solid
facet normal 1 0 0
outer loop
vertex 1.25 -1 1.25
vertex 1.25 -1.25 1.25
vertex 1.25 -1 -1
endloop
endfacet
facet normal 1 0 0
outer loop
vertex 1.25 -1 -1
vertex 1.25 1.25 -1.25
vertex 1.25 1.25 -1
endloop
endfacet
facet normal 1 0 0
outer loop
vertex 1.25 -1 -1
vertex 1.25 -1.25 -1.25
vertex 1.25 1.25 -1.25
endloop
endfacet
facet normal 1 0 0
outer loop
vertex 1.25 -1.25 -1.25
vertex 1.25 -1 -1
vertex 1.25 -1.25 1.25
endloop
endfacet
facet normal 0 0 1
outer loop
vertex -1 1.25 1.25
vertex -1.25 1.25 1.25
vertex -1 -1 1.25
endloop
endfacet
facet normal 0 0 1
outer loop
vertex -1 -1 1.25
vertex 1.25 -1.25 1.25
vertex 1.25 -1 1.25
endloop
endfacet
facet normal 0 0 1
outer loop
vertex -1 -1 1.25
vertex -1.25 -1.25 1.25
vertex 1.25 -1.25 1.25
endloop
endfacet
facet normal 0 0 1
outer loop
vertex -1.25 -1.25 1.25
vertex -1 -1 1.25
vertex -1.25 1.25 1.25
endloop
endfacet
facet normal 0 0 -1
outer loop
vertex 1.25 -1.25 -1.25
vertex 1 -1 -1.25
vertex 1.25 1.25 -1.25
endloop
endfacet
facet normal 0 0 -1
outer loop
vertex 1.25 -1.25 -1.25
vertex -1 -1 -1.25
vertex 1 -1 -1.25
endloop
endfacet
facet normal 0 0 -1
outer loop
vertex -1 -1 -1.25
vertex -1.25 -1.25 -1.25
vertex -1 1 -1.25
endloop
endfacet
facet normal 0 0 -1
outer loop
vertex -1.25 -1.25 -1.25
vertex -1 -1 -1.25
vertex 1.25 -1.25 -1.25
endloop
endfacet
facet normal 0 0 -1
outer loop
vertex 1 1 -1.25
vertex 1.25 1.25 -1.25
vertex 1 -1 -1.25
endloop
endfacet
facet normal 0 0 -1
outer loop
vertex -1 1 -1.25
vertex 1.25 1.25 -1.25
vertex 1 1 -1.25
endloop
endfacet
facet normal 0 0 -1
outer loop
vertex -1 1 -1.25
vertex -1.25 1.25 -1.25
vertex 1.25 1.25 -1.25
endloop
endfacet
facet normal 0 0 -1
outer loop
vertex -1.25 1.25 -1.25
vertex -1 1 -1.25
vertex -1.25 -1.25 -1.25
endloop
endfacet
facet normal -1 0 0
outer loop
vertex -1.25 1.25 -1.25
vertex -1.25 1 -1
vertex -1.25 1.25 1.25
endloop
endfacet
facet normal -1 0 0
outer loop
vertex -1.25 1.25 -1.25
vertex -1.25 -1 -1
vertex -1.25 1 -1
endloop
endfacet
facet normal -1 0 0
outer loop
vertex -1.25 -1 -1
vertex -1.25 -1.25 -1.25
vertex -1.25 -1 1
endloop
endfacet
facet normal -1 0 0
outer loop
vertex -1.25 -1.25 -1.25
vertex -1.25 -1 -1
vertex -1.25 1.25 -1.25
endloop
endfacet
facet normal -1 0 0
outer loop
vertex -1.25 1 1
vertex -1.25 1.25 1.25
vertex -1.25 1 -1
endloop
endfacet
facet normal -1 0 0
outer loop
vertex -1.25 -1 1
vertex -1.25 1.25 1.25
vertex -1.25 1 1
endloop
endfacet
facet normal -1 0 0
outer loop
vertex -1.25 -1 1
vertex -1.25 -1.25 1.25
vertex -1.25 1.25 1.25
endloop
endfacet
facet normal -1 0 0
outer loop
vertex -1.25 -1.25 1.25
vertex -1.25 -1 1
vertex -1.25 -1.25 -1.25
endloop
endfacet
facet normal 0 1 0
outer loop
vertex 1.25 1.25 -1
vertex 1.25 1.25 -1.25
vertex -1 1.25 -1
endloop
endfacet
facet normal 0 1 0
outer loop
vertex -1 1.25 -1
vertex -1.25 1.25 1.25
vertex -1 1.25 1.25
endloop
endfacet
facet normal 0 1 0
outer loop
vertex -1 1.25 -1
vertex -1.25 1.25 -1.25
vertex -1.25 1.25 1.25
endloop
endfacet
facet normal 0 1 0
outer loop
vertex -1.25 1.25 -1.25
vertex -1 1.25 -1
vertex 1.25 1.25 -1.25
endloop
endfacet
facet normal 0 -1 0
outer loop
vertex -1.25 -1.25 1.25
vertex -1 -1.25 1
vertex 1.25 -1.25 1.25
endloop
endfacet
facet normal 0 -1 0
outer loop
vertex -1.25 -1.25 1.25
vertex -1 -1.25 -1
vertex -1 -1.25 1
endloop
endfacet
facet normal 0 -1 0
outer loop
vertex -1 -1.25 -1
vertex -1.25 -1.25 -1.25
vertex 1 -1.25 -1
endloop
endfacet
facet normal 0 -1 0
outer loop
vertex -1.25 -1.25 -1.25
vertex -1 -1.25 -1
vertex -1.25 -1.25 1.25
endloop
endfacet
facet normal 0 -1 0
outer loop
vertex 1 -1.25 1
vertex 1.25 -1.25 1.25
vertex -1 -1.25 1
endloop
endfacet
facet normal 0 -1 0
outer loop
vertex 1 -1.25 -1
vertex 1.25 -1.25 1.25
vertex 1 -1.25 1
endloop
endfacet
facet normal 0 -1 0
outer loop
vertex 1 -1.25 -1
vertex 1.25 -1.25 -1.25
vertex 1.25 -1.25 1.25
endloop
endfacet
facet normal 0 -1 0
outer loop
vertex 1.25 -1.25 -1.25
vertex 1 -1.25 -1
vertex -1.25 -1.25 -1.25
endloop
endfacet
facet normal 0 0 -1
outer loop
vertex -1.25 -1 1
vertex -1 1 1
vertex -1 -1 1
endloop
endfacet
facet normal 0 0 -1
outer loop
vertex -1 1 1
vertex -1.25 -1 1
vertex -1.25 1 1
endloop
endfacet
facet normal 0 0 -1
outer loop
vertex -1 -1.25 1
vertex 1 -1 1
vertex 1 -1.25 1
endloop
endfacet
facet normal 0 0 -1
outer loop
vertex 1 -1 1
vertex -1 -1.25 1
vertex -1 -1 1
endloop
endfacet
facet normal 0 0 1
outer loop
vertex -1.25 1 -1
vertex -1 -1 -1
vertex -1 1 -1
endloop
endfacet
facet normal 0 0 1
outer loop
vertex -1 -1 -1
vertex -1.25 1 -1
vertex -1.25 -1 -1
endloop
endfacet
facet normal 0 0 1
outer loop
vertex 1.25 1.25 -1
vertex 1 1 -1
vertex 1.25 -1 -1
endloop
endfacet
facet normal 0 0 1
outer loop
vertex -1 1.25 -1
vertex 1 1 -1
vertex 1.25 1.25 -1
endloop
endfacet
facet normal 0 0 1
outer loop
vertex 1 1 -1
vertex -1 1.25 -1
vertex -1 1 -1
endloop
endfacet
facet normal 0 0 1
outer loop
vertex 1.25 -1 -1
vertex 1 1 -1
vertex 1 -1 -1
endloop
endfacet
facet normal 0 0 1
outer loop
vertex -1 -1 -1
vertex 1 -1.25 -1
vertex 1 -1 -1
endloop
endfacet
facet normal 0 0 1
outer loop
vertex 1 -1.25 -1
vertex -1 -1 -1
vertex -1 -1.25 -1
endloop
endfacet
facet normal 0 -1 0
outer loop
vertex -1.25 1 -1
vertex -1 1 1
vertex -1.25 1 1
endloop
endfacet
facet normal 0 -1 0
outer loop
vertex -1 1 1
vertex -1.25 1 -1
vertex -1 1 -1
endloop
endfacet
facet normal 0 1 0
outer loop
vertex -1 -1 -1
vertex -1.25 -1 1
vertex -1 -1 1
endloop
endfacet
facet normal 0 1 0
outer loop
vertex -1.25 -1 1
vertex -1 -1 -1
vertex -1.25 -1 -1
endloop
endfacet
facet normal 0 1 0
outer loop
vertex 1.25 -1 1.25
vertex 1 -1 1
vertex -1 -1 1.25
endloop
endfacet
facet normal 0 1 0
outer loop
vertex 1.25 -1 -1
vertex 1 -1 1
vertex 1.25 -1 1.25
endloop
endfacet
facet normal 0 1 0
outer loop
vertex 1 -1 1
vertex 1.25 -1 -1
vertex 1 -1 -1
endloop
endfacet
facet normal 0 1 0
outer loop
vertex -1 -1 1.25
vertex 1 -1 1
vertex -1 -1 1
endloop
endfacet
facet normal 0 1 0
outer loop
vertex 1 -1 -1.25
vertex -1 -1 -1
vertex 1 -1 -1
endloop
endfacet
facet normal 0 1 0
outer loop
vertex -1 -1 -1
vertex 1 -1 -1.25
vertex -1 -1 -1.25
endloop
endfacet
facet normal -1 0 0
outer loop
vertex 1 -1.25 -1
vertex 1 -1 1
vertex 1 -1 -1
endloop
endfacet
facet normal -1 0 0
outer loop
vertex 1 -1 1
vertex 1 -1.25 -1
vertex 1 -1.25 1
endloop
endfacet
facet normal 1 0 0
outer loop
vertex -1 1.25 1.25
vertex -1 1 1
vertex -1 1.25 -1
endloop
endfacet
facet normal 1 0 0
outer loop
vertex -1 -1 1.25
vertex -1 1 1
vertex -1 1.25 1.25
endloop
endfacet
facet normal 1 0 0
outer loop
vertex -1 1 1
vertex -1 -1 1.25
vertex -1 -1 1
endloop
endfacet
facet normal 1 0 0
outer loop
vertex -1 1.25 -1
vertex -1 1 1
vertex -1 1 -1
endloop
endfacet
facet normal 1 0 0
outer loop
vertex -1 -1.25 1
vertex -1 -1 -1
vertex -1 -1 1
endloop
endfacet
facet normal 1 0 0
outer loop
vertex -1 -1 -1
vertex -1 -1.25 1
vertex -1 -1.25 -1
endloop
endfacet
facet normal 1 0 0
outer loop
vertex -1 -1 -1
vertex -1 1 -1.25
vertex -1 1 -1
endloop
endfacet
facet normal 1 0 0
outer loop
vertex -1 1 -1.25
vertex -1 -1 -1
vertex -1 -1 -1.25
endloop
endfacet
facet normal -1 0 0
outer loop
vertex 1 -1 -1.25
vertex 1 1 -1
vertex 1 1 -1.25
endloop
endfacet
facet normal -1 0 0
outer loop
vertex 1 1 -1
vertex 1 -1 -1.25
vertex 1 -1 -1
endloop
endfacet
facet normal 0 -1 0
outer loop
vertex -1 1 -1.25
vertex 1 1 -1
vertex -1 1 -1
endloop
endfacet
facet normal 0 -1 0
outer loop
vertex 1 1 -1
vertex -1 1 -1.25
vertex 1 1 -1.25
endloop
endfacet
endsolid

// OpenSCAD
difference() {
	cube (size=2.5, center = true);
	cube(size=[4,2,2], center = true);
    cube(size=[2,4,2], center = true);
    cube(size=[2,2,4], center = true);
    cube(size=[2,2,4], center = true);
    translate([1,1,1]) cube(size=4, center = true);
}
